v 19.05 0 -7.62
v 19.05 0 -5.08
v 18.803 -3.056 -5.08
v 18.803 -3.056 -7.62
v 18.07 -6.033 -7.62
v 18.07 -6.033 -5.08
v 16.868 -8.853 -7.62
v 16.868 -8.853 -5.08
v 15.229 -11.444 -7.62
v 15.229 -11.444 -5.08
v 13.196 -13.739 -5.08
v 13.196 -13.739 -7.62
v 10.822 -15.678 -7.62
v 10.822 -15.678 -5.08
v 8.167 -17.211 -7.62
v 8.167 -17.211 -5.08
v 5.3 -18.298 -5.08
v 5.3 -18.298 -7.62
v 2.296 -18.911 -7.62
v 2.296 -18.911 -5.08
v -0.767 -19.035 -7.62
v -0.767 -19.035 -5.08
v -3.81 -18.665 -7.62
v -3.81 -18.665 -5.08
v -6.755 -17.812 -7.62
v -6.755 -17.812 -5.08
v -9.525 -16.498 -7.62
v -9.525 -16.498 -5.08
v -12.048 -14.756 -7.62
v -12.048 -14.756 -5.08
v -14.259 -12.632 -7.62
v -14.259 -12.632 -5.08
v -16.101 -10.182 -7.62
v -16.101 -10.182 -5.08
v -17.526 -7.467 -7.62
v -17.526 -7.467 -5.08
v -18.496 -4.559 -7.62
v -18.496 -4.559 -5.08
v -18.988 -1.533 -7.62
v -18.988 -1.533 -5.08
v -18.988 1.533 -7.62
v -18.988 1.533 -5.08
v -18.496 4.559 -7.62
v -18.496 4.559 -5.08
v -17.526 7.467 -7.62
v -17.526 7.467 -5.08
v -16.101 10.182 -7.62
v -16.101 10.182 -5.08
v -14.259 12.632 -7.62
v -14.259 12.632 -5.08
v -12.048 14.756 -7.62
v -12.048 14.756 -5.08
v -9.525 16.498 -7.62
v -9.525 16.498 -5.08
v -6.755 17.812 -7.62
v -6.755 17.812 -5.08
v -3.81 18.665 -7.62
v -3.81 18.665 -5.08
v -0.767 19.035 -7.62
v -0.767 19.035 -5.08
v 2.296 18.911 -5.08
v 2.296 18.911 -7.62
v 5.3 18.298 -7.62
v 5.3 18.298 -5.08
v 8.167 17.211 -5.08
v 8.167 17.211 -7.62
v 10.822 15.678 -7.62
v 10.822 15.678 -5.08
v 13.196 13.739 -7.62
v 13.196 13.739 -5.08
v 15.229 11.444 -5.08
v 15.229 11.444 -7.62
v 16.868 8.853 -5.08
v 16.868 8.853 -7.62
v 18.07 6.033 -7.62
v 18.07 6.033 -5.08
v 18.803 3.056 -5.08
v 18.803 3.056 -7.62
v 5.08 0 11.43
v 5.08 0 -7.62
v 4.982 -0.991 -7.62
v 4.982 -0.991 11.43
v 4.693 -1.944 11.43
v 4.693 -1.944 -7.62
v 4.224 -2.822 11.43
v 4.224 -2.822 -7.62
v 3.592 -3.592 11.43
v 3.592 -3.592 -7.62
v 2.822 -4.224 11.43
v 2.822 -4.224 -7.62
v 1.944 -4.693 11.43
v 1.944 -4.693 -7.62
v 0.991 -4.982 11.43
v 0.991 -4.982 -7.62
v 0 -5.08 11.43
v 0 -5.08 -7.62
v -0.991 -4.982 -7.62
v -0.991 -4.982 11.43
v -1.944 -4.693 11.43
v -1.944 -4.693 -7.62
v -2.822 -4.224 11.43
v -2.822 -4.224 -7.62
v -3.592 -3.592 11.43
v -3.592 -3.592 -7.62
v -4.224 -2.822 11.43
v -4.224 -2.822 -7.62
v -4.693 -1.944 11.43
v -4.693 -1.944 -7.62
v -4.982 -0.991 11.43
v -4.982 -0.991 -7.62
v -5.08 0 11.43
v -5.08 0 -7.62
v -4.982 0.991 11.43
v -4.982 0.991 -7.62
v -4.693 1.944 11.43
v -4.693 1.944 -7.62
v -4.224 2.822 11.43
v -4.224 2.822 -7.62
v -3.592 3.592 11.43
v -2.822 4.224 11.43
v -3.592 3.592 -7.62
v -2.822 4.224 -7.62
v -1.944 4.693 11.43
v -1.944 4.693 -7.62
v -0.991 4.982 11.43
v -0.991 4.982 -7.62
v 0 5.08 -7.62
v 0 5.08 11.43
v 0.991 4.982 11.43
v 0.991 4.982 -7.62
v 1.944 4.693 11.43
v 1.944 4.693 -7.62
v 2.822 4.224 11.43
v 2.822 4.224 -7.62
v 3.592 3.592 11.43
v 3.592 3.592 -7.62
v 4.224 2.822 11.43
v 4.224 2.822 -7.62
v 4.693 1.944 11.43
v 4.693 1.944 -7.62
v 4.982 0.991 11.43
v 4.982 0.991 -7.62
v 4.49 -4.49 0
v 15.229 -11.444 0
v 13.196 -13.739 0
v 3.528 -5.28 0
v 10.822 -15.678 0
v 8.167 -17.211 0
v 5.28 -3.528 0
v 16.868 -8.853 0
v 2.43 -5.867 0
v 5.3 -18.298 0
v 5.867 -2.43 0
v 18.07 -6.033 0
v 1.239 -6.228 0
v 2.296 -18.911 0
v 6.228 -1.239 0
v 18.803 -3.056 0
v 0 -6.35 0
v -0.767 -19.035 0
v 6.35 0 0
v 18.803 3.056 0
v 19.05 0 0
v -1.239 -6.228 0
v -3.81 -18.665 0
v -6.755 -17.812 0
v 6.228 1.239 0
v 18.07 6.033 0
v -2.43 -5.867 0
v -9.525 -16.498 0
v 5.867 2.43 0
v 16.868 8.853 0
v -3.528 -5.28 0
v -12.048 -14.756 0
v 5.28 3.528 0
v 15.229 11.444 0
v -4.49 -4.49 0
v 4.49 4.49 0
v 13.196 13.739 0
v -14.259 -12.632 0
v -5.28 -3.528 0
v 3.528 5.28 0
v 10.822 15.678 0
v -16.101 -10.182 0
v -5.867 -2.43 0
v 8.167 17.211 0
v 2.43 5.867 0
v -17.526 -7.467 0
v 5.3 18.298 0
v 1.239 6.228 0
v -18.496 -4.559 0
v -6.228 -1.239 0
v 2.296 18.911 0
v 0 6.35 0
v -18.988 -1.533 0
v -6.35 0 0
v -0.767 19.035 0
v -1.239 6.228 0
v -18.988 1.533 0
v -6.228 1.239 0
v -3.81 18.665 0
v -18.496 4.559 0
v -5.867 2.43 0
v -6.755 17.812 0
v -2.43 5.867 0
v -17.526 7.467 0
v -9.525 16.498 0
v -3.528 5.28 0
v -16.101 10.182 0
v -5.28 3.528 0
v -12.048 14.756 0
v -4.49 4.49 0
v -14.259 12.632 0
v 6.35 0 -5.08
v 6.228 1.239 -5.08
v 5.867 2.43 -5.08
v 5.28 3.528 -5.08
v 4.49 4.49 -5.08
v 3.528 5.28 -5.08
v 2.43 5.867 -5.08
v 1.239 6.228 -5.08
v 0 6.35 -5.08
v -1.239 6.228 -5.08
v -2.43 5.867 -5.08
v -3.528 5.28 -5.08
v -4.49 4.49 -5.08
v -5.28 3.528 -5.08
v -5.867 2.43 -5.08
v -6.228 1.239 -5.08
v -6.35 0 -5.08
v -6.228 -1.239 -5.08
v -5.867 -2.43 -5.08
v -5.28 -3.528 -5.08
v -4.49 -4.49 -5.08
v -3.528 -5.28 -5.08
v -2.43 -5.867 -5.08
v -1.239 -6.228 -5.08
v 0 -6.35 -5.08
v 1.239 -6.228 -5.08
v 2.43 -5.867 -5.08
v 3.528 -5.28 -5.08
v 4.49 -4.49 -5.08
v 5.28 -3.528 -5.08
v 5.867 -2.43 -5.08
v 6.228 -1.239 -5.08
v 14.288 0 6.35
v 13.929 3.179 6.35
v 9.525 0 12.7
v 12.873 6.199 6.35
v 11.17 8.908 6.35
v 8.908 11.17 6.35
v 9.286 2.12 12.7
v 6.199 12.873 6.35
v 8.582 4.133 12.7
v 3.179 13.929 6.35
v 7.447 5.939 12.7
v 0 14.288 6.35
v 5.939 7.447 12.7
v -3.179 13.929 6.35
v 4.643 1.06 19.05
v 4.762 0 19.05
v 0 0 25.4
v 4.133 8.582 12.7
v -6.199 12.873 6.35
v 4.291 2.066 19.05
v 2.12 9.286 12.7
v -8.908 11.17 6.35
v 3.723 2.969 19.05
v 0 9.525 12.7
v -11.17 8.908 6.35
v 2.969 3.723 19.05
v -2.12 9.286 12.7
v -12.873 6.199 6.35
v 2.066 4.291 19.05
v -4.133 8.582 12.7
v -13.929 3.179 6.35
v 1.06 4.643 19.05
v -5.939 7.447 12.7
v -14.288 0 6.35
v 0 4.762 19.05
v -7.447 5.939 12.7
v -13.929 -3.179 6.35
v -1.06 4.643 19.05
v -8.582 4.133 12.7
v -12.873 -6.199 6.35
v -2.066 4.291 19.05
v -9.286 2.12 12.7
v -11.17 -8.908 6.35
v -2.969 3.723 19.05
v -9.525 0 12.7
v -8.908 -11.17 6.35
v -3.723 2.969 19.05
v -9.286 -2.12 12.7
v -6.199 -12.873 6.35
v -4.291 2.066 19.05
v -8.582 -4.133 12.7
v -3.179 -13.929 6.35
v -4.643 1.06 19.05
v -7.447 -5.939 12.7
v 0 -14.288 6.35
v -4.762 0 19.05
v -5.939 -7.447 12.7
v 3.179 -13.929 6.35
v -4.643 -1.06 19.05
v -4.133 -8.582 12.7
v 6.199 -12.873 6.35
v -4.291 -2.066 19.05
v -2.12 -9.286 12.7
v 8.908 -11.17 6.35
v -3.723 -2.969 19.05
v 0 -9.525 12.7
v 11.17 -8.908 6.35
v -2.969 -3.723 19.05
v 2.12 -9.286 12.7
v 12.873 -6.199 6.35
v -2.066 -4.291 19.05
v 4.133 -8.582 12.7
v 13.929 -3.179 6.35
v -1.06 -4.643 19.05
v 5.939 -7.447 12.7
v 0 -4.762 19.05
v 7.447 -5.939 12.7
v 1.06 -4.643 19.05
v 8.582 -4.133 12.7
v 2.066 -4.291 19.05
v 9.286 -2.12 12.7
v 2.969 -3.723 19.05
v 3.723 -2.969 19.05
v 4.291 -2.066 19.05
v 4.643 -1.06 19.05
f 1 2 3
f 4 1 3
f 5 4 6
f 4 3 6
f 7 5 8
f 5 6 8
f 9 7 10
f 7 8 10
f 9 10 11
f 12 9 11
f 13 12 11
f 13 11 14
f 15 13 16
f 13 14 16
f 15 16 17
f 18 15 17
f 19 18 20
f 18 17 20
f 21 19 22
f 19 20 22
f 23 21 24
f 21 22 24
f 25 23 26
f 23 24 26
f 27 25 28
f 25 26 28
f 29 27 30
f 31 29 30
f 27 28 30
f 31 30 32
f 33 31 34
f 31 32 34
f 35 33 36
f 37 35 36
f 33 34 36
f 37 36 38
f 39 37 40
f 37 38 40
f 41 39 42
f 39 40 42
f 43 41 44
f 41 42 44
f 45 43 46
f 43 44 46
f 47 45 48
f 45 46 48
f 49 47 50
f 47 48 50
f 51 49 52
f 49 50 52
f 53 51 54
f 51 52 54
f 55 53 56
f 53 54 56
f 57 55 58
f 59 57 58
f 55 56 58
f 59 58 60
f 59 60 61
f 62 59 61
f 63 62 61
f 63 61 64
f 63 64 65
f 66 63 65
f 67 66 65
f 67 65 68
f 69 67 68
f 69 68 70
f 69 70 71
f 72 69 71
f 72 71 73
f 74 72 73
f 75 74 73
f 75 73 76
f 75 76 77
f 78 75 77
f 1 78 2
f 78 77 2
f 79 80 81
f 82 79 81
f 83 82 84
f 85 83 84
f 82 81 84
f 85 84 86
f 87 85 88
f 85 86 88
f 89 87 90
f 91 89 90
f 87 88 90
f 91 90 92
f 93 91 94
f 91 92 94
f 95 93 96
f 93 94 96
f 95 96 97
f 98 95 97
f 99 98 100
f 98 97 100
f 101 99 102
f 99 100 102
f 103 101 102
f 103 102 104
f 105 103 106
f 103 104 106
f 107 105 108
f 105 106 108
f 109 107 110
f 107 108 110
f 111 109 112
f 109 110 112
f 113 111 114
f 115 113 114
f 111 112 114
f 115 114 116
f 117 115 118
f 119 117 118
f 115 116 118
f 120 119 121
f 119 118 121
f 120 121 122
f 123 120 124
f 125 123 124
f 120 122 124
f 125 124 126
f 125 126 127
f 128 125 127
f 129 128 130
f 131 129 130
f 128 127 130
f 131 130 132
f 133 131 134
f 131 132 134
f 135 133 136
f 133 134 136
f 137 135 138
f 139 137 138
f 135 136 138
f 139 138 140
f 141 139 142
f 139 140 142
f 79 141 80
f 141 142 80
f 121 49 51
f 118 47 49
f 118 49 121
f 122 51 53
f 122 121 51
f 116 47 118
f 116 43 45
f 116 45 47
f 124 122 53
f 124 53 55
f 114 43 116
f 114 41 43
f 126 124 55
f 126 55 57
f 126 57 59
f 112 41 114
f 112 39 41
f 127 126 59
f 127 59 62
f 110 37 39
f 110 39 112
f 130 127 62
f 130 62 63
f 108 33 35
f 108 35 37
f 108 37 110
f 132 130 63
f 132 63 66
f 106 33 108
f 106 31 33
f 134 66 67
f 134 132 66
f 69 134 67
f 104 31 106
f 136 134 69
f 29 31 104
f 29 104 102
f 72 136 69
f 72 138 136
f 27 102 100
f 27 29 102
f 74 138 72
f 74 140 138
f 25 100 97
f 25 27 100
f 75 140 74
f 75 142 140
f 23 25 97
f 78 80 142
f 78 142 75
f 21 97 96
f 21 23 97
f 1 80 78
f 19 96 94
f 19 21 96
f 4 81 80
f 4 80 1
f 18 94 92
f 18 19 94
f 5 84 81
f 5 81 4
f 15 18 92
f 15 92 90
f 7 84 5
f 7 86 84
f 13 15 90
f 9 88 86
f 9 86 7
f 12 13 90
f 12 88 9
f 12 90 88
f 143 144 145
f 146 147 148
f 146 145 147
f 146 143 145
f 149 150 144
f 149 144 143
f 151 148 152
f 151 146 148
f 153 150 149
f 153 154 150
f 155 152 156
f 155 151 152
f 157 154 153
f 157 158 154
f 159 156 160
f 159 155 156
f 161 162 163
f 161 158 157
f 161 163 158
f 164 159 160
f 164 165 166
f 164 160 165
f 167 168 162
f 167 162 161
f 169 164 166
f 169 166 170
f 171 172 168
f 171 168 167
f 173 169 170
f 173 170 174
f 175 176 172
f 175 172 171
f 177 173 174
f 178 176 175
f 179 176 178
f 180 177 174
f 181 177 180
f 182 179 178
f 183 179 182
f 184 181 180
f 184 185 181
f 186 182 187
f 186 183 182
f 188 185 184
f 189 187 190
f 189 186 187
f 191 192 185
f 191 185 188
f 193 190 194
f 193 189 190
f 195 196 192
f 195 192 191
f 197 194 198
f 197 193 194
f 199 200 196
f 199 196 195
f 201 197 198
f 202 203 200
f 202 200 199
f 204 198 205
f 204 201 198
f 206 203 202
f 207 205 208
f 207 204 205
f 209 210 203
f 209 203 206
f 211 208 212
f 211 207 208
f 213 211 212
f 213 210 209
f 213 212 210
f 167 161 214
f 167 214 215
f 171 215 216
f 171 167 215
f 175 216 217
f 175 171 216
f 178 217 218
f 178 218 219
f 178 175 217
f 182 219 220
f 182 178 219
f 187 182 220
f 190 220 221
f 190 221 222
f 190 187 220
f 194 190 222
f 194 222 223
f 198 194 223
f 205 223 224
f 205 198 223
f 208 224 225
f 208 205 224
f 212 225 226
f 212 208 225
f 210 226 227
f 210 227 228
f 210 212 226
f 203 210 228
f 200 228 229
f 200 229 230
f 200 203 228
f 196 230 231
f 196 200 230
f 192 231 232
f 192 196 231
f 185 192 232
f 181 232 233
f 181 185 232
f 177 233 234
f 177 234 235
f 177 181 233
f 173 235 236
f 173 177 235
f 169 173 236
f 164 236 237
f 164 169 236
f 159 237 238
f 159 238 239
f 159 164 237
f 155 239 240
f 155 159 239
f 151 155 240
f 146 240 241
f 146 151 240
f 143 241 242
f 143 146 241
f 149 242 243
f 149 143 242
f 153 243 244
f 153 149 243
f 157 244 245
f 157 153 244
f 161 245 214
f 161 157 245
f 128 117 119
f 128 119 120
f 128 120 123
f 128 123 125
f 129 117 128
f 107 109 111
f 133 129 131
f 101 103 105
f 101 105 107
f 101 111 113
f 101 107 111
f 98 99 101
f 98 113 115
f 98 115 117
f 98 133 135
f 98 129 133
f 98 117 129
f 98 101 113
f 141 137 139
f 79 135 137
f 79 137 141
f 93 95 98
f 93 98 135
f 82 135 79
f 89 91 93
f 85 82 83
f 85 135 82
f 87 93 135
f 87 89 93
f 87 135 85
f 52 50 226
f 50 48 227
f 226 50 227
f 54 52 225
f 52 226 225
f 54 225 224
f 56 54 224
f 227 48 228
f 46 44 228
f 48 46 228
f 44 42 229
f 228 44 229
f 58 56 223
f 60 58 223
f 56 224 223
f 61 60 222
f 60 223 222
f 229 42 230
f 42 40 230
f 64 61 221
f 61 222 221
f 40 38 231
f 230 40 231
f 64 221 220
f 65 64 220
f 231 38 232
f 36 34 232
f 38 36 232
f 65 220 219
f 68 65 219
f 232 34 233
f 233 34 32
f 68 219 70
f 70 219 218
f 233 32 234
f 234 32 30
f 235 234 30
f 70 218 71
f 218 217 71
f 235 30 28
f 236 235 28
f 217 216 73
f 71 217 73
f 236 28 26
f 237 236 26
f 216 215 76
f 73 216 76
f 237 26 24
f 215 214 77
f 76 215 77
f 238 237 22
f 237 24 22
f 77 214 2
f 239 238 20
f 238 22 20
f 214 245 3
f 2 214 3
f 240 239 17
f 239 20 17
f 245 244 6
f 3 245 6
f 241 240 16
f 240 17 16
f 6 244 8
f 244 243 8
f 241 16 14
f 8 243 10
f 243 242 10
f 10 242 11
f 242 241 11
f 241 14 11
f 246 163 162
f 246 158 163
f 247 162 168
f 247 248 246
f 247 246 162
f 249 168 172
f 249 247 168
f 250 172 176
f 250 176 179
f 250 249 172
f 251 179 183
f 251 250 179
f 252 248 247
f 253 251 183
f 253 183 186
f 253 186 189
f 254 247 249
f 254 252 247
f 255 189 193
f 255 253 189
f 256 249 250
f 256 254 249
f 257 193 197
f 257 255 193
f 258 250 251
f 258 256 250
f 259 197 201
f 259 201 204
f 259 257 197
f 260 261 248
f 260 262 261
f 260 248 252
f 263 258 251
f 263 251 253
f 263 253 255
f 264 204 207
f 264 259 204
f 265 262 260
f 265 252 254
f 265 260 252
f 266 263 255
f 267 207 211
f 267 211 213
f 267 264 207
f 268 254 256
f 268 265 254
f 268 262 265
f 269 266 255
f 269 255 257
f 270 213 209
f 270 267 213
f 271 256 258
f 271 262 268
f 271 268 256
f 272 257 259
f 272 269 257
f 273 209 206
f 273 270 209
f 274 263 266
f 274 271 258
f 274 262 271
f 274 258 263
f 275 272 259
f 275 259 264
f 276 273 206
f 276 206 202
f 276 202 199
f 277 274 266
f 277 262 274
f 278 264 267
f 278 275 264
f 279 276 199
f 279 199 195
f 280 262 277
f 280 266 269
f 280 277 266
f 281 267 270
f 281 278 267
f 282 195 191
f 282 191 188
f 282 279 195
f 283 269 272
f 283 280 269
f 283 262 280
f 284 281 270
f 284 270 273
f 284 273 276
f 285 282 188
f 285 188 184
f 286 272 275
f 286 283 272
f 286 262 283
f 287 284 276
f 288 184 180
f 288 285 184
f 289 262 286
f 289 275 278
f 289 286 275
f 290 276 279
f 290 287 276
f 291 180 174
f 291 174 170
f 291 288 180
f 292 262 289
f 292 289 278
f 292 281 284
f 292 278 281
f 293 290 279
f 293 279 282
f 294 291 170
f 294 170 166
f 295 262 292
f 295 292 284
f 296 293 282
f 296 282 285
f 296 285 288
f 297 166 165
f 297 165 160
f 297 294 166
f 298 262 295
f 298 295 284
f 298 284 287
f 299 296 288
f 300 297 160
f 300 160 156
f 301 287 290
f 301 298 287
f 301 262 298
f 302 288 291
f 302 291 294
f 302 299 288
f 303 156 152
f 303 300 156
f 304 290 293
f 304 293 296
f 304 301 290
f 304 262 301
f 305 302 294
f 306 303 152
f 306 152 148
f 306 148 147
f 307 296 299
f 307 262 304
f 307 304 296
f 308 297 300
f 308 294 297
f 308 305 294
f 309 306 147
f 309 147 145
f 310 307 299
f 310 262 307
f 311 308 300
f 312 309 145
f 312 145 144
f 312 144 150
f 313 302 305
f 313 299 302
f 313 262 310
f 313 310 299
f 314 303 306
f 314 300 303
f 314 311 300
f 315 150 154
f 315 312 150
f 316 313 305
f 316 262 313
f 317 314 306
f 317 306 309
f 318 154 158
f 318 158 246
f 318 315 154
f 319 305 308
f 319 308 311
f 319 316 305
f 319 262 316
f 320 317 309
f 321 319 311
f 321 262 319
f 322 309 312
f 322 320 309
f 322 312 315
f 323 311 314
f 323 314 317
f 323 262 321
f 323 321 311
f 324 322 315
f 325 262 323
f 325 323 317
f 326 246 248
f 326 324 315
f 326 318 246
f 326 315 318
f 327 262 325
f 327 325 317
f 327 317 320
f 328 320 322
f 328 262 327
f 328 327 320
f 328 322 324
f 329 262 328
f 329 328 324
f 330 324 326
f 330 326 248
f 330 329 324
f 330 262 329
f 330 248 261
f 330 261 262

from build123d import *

# Parameters (mm, degrees)
F3_R     = 6.35
F4_DEPTH = 5.08
F5_R     = 19.05
F5_R_2   = 6.35
F6_DEPTH = 2.54
F7_R     = 5.08
F8_DEPTH = 19.05


with BuildPart() as f2:
    # F1 (on Front) → F2 (revolve)
    with BuildSketch(Plane.XZ):
        Polygon((0, 25.4), (0, 0), (19.05, 0), align=None)
    revolve(axis=Axis((0, 0, 12.7), (0, 0, 1)))

    # F3 (on face) → F4 (join)
    with BuildSketch(Plane.XY):
        Circle(F3_R)
    extrude(amount=-F4_DEPTH)

    # F5 (on face) → F6 (join)
    with BuildSketch(Plane(origin=(0, 0, -5.08), x_dir=(1, 0, 0), z_dir=(0, 0, -1))):
        Circle(F5_R)
        Circle(F5_R_2, mode=Mode.SUBTRACT)
        Circle(F5_R_2)
    extrude(amount=F6_DEPTH)

    # F7 (on face) → F8 (cut)
    with BuildSketch(Plane(origin=(0, 0, -7.62), x_dir=(1, 0, 0), z_dir=(0, 0, -1))):
        Circle(F7_R)
    extrude(amount=-F8_DEPTH, mode=Mode.SUBTRACT)


solid = f2.part
